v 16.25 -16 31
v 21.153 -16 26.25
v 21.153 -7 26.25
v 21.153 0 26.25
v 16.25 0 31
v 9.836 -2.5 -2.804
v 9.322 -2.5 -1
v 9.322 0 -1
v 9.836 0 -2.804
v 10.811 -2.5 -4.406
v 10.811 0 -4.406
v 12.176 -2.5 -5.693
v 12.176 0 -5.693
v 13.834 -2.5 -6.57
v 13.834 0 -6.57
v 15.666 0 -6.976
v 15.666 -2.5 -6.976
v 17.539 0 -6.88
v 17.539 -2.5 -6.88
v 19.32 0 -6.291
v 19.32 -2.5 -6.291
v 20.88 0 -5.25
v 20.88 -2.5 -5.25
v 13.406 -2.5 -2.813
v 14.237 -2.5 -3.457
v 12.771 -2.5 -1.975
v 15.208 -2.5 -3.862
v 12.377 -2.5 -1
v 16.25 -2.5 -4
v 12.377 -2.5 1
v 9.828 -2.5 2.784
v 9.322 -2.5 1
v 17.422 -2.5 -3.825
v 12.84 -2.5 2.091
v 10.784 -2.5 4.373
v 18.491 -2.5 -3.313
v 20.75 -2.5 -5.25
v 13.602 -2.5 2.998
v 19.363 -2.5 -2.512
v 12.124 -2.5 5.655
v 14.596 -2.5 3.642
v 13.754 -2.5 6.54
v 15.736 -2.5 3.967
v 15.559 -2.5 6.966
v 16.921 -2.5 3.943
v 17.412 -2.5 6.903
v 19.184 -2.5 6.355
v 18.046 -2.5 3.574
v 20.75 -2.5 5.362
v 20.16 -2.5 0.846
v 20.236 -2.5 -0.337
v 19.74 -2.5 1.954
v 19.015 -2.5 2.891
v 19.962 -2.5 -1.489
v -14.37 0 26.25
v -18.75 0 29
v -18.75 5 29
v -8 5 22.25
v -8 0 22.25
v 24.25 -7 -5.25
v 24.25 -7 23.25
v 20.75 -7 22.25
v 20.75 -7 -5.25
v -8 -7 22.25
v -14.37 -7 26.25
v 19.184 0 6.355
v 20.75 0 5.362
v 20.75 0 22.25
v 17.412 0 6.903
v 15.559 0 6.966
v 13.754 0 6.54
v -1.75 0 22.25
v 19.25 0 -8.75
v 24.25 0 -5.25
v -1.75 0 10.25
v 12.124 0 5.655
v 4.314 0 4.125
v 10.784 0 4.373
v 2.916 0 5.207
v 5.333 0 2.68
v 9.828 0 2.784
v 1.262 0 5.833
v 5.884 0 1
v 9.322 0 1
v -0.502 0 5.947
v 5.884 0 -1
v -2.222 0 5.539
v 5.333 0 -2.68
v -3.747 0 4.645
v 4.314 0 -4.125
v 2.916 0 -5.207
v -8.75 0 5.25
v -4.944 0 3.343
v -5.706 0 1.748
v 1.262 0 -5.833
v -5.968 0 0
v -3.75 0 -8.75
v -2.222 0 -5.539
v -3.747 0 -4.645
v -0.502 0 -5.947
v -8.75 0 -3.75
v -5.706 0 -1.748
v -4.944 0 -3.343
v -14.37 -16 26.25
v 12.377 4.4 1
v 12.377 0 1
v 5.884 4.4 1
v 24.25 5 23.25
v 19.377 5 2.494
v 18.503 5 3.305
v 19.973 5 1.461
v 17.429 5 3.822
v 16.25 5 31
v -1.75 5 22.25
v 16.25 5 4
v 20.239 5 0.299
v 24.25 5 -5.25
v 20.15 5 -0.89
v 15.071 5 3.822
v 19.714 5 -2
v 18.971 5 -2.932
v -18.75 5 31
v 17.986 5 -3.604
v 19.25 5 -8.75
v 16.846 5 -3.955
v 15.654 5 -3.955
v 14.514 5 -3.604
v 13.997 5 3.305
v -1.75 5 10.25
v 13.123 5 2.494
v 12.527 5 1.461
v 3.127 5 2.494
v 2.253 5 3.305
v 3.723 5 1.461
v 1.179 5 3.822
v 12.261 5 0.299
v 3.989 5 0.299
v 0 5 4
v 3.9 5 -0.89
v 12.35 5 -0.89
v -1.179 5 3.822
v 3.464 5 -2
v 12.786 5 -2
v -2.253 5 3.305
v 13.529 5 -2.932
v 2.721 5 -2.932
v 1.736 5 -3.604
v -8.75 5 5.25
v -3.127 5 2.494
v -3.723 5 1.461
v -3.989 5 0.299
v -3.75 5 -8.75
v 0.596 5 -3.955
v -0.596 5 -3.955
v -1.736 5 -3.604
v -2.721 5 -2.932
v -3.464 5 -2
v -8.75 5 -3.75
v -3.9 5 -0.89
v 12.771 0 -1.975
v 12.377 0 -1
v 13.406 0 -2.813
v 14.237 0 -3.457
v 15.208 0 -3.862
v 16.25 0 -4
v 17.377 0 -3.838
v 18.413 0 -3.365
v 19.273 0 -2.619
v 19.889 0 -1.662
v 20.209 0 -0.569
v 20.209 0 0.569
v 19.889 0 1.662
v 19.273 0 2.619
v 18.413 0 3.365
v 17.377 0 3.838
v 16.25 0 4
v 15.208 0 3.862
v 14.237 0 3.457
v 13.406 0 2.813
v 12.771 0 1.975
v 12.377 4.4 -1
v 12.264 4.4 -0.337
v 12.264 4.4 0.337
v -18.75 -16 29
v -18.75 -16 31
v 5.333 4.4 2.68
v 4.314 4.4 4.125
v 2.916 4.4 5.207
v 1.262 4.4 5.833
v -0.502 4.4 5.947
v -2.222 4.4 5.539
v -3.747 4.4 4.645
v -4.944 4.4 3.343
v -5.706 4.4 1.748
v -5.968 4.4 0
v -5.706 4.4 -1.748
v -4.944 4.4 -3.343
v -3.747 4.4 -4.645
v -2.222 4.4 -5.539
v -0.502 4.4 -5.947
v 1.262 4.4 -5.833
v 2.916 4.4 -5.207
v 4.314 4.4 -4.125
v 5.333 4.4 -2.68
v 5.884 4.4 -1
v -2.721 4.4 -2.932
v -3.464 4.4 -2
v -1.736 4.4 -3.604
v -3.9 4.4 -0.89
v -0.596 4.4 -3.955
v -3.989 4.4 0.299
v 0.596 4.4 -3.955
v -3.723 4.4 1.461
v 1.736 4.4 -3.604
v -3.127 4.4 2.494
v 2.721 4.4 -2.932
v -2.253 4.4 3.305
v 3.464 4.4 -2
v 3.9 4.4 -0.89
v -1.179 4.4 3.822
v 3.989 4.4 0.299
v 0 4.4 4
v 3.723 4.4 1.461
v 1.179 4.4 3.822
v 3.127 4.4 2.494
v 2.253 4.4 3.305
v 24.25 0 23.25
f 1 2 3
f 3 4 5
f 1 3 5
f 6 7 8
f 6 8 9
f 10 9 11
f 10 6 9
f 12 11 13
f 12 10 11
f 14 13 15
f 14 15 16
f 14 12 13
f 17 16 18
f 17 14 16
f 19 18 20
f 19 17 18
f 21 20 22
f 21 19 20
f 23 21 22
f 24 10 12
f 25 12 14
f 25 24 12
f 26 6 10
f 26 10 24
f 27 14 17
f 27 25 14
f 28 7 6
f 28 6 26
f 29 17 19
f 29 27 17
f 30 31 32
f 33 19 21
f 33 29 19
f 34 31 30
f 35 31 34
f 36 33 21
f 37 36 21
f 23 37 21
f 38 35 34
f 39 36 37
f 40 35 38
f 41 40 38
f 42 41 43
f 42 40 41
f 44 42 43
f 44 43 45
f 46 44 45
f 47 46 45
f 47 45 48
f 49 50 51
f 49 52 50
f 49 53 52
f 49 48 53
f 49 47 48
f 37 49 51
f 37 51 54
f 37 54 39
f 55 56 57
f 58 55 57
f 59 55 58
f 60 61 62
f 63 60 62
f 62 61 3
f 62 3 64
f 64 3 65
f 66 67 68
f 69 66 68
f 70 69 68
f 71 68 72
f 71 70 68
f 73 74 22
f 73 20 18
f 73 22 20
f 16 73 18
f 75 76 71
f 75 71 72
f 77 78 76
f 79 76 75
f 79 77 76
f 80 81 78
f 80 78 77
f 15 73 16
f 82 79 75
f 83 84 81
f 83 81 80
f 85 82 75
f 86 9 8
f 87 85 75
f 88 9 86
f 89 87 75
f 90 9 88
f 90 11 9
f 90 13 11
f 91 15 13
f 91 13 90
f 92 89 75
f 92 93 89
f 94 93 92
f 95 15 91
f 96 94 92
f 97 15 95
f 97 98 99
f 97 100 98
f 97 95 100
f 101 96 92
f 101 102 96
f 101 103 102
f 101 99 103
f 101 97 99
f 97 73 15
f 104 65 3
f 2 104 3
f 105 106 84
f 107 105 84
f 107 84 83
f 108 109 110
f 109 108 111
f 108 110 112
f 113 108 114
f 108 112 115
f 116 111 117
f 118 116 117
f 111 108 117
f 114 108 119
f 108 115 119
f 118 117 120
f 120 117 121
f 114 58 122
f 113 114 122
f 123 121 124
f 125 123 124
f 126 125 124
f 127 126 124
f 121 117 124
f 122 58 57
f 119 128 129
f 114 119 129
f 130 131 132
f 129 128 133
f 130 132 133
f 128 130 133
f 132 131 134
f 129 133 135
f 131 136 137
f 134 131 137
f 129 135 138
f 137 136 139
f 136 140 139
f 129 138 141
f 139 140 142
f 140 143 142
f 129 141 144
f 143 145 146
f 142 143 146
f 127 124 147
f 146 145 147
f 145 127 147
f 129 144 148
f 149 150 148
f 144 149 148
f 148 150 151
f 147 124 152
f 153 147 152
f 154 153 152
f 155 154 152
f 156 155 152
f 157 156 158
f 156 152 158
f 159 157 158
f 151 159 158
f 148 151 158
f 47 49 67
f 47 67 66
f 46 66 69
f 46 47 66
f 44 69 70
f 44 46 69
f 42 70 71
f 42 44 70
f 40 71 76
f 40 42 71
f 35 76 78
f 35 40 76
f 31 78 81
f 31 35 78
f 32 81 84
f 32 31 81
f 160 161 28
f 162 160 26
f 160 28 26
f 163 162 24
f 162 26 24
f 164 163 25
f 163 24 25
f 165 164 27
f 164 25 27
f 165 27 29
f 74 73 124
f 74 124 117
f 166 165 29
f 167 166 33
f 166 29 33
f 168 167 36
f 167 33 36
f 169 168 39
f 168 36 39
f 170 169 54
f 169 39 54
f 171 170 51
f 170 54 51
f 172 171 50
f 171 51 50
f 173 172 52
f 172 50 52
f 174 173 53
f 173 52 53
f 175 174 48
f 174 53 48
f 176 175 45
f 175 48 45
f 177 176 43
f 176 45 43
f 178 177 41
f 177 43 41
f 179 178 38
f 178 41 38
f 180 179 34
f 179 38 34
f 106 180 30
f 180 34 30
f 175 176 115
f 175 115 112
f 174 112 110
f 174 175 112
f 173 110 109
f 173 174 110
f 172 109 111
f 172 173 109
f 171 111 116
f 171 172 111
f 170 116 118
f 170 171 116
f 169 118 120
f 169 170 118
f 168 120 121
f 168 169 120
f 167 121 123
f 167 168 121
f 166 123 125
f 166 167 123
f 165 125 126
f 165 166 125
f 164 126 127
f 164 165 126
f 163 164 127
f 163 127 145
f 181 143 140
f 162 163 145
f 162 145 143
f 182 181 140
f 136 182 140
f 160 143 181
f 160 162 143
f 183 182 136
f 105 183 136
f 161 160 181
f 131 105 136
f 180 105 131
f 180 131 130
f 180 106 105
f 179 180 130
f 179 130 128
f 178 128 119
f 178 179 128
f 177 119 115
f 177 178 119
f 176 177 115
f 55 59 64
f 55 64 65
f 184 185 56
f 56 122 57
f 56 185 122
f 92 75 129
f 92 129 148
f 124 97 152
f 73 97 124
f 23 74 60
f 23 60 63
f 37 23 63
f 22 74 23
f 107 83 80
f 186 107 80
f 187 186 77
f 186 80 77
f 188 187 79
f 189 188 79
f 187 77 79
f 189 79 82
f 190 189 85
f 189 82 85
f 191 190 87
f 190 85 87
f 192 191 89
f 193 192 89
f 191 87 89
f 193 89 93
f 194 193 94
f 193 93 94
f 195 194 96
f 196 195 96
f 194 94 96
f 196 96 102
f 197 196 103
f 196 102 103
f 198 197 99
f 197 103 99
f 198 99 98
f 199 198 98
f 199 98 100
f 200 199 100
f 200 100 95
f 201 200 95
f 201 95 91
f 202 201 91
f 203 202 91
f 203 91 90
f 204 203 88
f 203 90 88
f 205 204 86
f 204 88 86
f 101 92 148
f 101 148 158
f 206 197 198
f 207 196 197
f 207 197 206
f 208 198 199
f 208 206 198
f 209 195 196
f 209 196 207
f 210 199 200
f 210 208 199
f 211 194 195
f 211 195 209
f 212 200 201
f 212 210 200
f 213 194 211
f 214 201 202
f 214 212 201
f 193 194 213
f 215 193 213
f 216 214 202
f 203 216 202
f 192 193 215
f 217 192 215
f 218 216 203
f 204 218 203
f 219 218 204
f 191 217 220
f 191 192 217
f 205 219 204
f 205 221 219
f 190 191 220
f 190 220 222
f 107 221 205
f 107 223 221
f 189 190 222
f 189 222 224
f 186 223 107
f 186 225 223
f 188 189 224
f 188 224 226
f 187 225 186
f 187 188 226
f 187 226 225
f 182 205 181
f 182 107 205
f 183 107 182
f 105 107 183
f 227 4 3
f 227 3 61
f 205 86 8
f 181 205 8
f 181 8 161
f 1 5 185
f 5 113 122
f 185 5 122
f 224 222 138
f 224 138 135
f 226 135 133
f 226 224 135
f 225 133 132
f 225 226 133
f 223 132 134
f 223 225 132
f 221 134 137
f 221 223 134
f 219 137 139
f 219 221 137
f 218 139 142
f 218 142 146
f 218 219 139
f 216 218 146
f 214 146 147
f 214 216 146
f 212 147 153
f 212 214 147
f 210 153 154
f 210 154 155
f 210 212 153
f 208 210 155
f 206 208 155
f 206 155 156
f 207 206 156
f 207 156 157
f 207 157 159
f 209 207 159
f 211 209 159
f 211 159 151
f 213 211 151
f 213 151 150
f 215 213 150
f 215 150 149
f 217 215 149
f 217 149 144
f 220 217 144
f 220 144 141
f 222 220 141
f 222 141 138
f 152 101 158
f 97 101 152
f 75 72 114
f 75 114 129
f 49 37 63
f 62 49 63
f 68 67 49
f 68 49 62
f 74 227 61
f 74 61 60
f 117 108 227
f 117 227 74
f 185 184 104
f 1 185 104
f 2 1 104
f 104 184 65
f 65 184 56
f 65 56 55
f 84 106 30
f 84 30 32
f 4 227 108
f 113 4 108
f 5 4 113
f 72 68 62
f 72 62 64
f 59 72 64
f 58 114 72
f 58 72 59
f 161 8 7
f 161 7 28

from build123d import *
from build123d.topology import SkipClean

# Parameters (mm, degrees)
SKETCH1_R           = 4
BOSS_EXTRUDE1_DEPTH = 5
BOSS_EXTRUDE2_DEPTH = 7
BOSS_EXTRUDE3_DEPTH = 16
BOSS_EXTRUDE4_START = 2.5
SKETCH6_R           = 7
SKETCH6_R_2         = 4
BOSS_EXTRUDE4_DEPTH = 2.5
CUT_EXTRUDE1_DEPTH  = 4.4
CUT_EXTRUDE2_DEPTH  = 45.33083013


with BuildPart() as part:
    # Sketch1 → Boss-Extrude1 (new body)
    with BuildSketch(Plane(origin=(0, 0, 0), x_dir=(1, 0, 0), z_dir=(0, 1, 0))):
        Polygon((-3.75, 8.75), (19.25, 8.75), (24.25, 5.25), (24.25, -23.25), (16.25, -31), (-18.75, -31), (-18.75, -29), (-8, -22.25), (-1.75, -22.25), (-1.75, -10.25), (-8.75, -5.25), (-8.75, 3.75), align=None)
        with Locations(Location((0, 0, 0), (0, 0, 270))):
            Circle(SKETCH1_R, mode=Mode.SUBTRACT)
        with Locations(Location((16.25, 0, 0), (0, 0, 270))):
            Circle(SKETCH1_R, mode=Mode.SUBTRACT)
    extrude(amount=BOSS_EXTRUDE1_DEPTH)

    # Sketch2 → Boss-Extrude2 (add)
    with BuildSketch(Plane.XZ):
        Polygon((24.25, 23.25), (24.25, -5.25), (20.75, -5.25), (20.75, 22.25), (-8, 22.25), (-14.37037037, 26.25), (21.153225806, 26.25), align=None)
    extrude(amount=BOSS_EXTRUDE2_DEPTH)

    # Sketch3 → Boss-Extrude3 (add)
    with BuildSketch(Plane.XZ):
        Polygon((-14.37037037, 26.25), (21.153225806, 26.25), (16.25, 31), (-18.75, 31), (-18.75, 29), align=None)
    extrude(amount=BOSS_EXTRUDE3_DEPTH)

    # Sketch6 → Boss-Extrude4 (add)
    with SkipClean():  # the faces are left unmerged after this step: merging them gives an invalid solid
        with BuildSketch(Plane.XZ.offset(BOSS_EXTRUDE4_START)):
            with Locations((16.25, 0)):
                Circle(SKETCH6_R)
            with Locations(Location((16.25, 0, 0), (0, 0, 270))):
                Circle(SKETCH6_R_2, mode=Mode.SUBTRACT)
        extrude(amount=-BOSS_EXTRUDE4_DEPTH)

    # Sketch4 → Cut-Extrude1 (cut)
    with SkipClean():  # the faces are left unmerged after this step: merging them gives an invalid solid
        with BuildSketch(Plane.XZ):
            with BuildLine():
                Line((5.883782294, -1), (12.377016654, -1))
                ThreePointArc((12.377016654, -1), (12.25, 0), (12.377016654, 1))
                Line((12.377016654, 1), (5.883782294, 1))
                ThreePointArc((5.883782294, 1), (-5.968156673, 0), (5.883782294, -1))
            make_face()
        extrude(amount=-CUT_EXTRUDE1_DEPTH, mode=Mode.SUBTRACT)

    # Sketch7 → Cut-Extrude2 (cut, through all)
    with SkipClean():  # the faces are left unmerged after this step: merging them gives an invalid solid
        with BuildSketch(Plane.XZ.offset(-4.4)):
            with BuildLine():
                Line((5.883782294, -1), (12.377016654, -1))
                ThreePointArc((12.377016654, -1), (12.25, 0), (12.377016654, 1))
                Line((12.377016654, 1), (5.883782294, 1))
                ThreePointArc((5.883782294, 1), (-5.968156673, 0), (5.883782294, -1))
            make_face()
        extrude(amount=CUT_EXTRUDE2_DEPTH, mode=Mode.SUBTRACT)


solid = part.part
